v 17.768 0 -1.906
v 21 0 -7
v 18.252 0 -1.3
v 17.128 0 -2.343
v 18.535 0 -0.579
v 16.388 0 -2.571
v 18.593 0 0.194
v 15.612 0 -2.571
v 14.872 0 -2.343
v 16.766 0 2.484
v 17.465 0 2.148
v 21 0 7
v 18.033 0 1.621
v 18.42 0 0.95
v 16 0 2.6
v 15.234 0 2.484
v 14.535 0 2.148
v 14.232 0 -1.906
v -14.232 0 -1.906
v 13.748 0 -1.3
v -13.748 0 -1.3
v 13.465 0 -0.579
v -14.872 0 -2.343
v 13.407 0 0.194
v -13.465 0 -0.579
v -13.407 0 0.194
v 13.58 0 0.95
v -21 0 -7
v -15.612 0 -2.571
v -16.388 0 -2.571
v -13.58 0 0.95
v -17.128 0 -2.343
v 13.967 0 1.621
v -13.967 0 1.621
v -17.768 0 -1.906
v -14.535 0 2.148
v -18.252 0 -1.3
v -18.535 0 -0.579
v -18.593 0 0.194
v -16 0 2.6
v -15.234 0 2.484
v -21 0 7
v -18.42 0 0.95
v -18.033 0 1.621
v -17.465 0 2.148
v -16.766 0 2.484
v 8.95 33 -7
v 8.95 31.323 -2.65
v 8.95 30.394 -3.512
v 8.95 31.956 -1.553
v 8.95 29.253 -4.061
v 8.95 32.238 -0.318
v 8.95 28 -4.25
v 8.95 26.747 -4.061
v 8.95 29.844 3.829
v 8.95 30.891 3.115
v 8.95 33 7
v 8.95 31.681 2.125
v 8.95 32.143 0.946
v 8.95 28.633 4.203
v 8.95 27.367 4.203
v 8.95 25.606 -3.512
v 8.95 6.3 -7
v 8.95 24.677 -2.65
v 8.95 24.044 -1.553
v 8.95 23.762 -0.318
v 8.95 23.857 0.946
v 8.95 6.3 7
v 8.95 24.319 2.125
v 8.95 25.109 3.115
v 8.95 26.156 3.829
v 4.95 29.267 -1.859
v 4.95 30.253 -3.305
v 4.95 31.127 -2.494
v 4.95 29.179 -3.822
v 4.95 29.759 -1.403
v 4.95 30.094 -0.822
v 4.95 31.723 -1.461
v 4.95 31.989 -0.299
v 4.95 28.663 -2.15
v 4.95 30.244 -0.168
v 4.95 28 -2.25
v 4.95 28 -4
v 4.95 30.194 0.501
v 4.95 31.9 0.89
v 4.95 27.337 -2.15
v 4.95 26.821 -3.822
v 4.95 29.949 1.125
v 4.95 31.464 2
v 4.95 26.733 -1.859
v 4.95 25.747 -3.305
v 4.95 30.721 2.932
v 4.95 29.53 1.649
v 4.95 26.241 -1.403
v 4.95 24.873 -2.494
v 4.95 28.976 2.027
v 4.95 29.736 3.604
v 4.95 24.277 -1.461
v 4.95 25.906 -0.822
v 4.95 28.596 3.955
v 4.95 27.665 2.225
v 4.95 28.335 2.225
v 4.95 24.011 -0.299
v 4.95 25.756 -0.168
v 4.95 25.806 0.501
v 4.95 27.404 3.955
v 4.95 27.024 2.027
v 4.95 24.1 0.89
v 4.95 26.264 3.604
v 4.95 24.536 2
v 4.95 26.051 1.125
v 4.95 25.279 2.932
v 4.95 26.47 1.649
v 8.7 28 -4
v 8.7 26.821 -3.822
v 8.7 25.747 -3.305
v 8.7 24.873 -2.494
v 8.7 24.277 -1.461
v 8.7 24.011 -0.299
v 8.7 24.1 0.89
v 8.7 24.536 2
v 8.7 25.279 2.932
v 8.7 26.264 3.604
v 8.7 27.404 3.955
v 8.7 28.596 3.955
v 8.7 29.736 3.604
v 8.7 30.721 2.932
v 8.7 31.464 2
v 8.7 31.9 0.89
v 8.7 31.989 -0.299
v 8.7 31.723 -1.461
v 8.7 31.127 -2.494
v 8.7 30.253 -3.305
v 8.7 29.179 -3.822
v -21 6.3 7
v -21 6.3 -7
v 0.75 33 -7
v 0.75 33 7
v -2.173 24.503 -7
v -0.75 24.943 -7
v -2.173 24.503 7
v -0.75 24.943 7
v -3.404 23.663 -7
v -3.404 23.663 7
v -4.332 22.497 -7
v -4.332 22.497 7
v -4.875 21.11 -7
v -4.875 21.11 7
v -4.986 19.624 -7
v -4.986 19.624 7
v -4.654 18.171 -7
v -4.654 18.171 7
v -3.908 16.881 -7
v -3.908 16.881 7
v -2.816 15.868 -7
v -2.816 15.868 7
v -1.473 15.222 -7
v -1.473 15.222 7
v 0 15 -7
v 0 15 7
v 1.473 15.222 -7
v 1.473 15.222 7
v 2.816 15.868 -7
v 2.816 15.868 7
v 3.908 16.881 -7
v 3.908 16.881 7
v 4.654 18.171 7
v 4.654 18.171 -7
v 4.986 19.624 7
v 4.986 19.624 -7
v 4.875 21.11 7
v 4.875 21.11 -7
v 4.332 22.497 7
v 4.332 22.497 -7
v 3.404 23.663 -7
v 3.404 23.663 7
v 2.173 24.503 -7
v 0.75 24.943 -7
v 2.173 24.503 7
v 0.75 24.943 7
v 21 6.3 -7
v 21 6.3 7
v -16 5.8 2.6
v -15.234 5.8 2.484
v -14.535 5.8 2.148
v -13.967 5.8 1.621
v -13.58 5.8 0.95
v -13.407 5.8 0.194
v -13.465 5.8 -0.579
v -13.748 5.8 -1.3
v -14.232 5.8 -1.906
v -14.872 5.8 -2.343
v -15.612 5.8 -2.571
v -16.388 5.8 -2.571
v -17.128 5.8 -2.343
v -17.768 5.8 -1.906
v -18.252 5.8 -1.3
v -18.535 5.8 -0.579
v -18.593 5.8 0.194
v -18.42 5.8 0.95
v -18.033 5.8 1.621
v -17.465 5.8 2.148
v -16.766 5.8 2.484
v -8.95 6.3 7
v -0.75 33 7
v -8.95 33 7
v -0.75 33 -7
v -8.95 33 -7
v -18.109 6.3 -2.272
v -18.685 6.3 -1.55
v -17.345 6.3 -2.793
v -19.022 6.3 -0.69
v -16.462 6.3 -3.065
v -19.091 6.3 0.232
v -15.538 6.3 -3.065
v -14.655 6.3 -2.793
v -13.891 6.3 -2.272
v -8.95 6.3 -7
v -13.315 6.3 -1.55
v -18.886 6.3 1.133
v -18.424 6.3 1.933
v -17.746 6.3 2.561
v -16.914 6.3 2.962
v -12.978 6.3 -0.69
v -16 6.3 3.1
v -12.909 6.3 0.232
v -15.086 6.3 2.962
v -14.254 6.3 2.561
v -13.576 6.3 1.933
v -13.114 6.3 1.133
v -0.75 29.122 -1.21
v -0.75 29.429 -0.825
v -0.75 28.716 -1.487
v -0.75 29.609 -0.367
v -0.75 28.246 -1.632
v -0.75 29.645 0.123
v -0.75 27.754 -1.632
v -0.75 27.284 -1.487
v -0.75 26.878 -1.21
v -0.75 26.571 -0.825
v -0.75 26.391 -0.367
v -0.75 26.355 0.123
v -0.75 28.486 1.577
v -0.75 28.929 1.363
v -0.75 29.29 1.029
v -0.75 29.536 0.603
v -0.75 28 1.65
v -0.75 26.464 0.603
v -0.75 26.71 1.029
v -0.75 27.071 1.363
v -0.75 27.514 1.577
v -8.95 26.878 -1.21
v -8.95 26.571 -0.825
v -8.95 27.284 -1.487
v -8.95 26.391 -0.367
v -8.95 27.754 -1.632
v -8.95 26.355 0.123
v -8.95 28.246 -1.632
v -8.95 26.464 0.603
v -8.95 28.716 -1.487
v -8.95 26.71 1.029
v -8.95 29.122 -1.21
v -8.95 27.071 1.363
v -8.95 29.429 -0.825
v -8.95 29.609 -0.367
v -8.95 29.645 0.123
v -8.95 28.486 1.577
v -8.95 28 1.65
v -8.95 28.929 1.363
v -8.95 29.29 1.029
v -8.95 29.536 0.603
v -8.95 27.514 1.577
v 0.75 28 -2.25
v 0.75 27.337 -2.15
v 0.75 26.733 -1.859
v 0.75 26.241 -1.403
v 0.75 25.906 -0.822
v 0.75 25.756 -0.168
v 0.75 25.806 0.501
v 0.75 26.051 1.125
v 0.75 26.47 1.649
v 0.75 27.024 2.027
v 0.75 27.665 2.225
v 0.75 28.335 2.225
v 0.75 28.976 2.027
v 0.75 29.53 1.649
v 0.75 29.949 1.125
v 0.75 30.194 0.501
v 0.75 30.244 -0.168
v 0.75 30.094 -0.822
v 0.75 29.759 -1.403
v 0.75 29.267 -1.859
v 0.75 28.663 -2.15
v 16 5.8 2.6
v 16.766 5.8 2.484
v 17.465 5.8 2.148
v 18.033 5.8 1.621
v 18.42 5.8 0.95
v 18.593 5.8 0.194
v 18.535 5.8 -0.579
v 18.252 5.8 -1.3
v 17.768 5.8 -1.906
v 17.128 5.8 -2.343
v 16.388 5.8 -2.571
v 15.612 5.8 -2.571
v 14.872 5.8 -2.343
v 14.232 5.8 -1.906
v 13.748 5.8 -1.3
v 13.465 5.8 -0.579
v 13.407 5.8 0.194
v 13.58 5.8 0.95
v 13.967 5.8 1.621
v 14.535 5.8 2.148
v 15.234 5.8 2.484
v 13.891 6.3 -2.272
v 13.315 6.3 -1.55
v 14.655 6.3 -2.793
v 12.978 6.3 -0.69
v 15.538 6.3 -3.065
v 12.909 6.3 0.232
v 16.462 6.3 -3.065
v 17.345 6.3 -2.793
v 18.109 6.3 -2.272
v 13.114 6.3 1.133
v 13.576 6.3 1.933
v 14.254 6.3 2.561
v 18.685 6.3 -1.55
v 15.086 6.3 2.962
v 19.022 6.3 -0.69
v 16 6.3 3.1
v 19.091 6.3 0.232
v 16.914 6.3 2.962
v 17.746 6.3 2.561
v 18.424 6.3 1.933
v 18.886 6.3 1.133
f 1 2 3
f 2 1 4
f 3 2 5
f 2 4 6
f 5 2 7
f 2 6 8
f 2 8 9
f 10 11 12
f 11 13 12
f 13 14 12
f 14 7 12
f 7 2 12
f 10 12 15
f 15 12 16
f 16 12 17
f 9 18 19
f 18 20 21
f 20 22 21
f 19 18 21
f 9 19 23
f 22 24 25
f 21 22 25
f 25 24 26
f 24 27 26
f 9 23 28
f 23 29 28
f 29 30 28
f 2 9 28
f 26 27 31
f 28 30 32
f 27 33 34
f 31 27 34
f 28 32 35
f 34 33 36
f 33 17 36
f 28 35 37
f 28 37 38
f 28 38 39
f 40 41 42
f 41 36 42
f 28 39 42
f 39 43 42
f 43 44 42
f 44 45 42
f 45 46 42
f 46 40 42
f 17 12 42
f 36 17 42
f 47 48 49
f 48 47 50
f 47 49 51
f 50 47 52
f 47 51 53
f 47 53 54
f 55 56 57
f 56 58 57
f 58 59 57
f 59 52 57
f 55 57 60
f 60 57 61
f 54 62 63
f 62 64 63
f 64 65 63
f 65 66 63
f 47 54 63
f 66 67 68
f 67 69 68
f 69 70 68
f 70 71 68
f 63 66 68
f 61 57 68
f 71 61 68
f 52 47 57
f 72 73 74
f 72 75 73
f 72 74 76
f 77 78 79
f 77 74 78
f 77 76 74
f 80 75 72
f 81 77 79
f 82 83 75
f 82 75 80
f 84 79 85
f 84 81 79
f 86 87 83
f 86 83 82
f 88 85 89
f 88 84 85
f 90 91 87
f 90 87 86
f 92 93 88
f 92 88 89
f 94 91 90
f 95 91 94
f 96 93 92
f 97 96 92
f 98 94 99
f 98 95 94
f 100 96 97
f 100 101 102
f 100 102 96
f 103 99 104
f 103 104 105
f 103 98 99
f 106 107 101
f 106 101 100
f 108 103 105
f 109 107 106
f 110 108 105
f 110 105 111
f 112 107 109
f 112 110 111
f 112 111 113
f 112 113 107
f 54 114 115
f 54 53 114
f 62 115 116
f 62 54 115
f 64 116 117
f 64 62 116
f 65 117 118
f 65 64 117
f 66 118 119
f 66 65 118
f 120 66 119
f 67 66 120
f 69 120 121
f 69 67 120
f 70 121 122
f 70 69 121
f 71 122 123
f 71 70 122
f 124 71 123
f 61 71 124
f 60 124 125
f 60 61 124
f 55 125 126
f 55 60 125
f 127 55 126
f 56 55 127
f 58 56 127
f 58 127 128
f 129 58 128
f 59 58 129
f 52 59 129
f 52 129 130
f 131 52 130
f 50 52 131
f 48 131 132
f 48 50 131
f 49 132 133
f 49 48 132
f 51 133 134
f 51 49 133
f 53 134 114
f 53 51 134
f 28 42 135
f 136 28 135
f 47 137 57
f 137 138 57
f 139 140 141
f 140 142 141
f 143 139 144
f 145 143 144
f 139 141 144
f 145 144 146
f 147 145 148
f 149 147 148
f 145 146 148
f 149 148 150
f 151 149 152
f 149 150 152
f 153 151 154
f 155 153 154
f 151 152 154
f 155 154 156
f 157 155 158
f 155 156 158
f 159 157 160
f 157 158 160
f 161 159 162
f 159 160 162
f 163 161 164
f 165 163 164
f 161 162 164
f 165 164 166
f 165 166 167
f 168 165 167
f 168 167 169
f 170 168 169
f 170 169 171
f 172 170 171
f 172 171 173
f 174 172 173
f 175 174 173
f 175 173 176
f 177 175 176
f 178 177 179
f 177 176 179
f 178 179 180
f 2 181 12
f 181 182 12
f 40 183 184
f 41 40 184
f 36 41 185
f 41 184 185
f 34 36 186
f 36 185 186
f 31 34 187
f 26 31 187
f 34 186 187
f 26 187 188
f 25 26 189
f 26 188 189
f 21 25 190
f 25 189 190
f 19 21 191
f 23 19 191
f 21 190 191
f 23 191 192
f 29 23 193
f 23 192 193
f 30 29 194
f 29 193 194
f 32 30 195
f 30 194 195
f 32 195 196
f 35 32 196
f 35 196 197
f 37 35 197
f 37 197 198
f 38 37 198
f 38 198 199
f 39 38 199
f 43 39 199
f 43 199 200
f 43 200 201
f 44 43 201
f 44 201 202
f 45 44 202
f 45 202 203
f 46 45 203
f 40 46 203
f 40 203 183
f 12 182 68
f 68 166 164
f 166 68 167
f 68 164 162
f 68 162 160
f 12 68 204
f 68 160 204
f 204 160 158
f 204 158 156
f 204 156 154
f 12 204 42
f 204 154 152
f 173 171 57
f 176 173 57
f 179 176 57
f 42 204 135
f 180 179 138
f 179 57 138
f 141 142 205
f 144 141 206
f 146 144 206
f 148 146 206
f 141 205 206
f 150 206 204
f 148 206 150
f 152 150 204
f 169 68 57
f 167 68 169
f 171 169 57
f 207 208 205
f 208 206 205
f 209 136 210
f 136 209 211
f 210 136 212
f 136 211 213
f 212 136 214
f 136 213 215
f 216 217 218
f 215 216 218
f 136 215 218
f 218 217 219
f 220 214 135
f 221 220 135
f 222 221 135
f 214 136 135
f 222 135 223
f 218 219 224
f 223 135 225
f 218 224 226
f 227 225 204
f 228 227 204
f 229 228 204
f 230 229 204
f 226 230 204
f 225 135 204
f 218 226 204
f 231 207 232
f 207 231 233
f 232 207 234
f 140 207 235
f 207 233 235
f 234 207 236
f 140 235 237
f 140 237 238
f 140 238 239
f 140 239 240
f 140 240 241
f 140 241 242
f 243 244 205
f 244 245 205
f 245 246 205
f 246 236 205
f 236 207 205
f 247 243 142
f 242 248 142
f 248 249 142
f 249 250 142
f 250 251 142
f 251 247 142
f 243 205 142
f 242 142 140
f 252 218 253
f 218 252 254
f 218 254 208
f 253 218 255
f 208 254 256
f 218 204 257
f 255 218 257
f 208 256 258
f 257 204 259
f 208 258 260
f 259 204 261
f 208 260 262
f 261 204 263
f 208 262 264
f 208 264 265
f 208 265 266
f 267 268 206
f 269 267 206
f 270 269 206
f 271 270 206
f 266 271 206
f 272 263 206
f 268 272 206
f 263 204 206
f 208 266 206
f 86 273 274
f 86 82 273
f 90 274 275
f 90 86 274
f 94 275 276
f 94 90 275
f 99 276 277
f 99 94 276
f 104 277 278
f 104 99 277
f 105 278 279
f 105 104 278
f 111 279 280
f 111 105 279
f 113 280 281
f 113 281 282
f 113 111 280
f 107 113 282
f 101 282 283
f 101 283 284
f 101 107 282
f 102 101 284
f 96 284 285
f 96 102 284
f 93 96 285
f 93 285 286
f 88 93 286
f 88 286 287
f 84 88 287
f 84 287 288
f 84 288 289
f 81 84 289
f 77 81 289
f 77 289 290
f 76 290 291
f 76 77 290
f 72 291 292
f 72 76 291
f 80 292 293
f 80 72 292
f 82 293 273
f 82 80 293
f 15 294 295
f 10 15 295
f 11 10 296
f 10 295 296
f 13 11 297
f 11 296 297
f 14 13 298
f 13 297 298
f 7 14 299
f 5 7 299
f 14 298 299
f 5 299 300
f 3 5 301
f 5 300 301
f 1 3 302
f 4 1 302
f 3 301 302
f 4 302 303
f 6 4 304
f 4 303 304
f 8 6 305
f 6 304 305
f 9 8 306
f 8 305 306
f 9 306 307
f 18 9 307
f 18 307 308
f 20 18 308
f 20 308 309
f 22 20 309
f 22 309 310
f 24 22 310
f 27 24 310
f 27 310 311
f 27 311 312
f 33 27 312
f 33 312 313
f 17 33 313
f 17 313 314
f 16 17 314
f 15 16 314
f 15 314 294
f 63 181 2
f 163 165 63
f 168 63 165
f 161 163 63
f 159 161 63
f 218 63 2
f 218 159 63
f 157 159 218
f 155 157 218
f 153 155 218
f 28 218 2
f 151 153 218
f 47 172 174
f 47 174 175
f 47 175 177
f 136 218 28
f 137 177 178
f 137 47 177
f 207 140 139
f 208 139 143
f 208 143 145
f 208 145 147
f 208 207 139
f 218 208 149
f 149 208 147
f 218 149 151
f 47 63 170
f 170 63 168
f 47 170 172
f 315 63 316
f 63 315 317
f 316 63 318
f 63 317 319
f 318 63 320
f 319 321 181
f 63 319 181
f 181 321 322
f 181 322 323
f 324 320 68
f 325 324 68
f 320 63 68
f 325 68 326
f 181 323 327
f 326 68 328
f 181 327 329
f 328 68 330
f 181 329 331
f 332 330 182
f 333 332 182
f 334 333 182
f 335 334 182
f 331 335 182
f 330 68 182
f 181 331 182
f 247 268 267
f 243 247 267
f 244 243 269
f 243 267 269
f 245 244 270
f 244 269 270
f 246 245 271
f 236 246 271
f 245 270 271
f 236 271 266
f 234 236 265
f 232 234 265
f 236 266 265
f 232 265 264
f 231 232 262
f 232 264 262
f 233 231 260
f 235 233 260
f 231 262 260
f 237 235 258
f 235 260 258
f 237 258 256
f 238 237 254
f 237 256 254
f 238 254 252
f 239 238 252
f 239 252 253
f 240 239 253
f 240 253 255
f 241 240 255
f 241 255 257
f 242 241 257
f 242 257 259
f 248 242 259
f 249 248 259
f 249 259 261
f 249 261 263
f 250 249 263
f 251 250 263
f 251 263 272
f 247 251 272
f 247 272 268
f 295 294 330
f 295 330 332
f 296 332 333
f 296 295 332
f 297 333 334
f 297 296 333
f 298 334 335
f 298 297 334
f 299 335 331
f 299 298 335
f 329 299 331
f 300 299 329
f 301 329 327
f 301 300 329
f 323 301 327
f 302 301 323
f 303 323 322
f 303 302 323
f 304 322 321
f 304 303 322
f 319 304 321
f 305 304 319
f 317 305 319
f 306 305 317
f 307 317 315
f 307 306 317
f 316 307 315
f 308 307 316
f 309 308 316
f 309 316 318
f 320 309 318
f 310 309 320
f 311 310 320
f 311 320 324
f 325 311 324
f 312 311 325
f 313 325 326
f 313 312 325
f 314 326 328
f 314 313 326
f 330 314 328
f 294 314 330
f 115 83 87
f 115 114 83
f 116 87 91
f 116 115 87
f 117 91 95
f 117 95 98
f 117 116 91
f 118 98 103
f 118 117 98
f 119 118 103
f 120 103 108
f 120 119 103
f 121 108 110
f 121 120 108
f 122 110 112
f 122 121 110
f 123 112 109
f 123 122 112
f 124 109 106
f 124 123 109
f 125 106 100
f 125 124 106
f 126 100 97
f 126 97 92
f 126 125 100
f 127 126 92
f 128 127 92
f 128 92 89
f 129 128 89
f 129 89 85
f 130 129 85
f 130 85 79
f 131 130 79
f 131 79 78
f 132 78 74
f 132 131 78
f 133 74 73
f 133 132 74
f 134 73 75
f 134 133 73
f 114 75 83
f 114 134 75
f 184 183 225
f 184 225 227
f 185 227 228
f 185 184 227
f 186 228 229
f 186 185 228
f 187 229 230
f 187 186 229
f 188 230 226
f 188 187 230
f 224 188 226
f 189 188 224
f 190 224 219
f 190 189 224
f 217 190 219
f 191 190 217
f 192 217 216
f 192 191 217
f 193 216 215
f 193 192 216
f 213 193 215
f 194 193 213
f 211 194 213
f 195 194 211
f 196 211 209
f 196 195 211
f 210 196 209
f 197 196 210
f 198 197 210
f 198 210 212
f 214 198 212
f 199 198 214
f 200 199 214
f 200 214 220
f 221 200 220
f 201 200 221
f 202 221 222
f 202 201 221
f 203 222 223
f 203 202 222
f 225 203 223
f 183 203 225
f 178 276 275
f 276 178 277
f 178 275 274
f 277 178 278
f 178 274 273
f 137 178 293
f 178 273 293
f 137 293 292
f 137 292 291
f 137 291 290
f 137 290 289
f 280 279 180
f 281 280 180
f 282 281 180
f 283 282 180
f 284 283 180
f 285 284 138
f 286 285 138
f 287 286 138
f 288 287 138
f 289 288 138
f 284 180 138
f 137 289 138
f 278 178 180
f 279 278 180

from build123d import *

# Parameters (mm, degrees)
BOSS_EXTRUDE1_DEPTH   = 7
CUT_EXTRUDE1_REACH    = 36.683
SKETCH2_R             = 2.6
CHAMFER1_SIZE         = 0.5
M4X0_7_TAPPED_HOLE1_D = 3.3


with BuildPart() as part:
    # Sketch1 → Boss-Extrude1 (new, symmetric)
    with BuildSketch(Plane.XY):
        with BuildLine():
            Line((-21, 6.3), (-8.95, 6.3))
            Line((-8.95, 6.3), (-8.95, 33))
            Line((-8.95, 33), (-0.75, 33))
            Line((-0.75, 33), (-0.75, 24.943429983))
            ThreePointArc((-0.75, 24.943429983), (0, 15), (0.75, 24.943429983))
            Line((0.75, 24.943429983), (0.75, 33))
            Line((0.75, 33), (8.95, 33))
            Line((8.95, 33), (8.95, 6.3))
            Line((8.95, 6.3), (21, 6.3))
            Line((21, 6.3), (21, 0))
            Line((21, 0), (-21, 0))
            Line((-21, 0), (-21, 6.3))
        make_face()
    extrude(amount=BOSS_EXTRUDE1_DEPTH, both=True)

    # Sketch2 → Cut-Extrude1 (cut, up to next)
    with BuildSketch(Plane(origin=(0, 6.3, 0), x_dir=(1, 0, 0), z_dir=(0, 1, 0)), mode=Mode.PRIVATE) as cut_extrude1_sk1:
        with Locations(Location((16, 0, 0), (0, 0, 270))):
            Circle(SKETCH2_R)
    cut_extrude1_tool1 = extrude(cut_extrude1_sk1.sketch, amount=-CUT_EXTRUDE1_REACH, mode=Mode.PRIVATE) & part.part
    # Sketch2 → Cut-Extrude1 (cut, up to next)
    with BuildSketch(Plane(origin=(0, 6.3, 0), x_dir=(1, 0, 0), z_dir=(0, 1, 0)), mode=Mode.PRIVATE) as cut_extrude1_sk2:
        with Locations(Location((-16, 0, 0), (0, 0, 270))):
            Circle(SKETCH2_R)
    cut_extrude1_tool2 = extrude(cut_extrude1_sk2.sketch, amount=-CUT_EXTRUDE1_REACH, mode=Mode.PRIVATE) & part.part
    add(cut_extrude1_tool1.solids().sort_by_distance((16, 6.3, 0))[0], mode=Mode.SUBTRACT)
    add(cut_extrude1_tool2.solids().sort_by_distance((-16, 6.3, 0))[0], mode=Mode.SUBTRACT)

    # Chamfer1
    chamfer1_edges = [part.edges().sort_by_distance(p)[0] for p in [
        (16, 6.3, -2.6),
        (-16, 6.3, -2.6),
    ]]
    chamfer(chamfer1_edges, length=CHAMFER1_SIZE)

    # Sketch4 → CBORE for M4 SHCS2 (revolve, cut)
    with BuildSketch(Plane(origin=(8.95, 28, 0), x_dir=(0, 0, -1), z_dir=(0, 1, 0))):
        Polygon((0, 0), (0, 8.2), (2.25, 8.2), (2.25, 4), (4, 4), (4, 0.25), (4.25, 0), align=None)
    revolve(axis=Axis((15.3, 28, 0), (-1, 0, 0)), mode=Mode.SUBTRACT)

    # M4x0.7 Tapped Hole1 (through all)
    with Locations(Plane(origin=(-0.75, 0, 0), x_dir=(0, 0, -1), z_dir=(1, 0, 0))):
        with Locations((0, 28)):
            Hole(M4X0_7_TAPPED_HOLE1_D / 2)


solid = part.part
